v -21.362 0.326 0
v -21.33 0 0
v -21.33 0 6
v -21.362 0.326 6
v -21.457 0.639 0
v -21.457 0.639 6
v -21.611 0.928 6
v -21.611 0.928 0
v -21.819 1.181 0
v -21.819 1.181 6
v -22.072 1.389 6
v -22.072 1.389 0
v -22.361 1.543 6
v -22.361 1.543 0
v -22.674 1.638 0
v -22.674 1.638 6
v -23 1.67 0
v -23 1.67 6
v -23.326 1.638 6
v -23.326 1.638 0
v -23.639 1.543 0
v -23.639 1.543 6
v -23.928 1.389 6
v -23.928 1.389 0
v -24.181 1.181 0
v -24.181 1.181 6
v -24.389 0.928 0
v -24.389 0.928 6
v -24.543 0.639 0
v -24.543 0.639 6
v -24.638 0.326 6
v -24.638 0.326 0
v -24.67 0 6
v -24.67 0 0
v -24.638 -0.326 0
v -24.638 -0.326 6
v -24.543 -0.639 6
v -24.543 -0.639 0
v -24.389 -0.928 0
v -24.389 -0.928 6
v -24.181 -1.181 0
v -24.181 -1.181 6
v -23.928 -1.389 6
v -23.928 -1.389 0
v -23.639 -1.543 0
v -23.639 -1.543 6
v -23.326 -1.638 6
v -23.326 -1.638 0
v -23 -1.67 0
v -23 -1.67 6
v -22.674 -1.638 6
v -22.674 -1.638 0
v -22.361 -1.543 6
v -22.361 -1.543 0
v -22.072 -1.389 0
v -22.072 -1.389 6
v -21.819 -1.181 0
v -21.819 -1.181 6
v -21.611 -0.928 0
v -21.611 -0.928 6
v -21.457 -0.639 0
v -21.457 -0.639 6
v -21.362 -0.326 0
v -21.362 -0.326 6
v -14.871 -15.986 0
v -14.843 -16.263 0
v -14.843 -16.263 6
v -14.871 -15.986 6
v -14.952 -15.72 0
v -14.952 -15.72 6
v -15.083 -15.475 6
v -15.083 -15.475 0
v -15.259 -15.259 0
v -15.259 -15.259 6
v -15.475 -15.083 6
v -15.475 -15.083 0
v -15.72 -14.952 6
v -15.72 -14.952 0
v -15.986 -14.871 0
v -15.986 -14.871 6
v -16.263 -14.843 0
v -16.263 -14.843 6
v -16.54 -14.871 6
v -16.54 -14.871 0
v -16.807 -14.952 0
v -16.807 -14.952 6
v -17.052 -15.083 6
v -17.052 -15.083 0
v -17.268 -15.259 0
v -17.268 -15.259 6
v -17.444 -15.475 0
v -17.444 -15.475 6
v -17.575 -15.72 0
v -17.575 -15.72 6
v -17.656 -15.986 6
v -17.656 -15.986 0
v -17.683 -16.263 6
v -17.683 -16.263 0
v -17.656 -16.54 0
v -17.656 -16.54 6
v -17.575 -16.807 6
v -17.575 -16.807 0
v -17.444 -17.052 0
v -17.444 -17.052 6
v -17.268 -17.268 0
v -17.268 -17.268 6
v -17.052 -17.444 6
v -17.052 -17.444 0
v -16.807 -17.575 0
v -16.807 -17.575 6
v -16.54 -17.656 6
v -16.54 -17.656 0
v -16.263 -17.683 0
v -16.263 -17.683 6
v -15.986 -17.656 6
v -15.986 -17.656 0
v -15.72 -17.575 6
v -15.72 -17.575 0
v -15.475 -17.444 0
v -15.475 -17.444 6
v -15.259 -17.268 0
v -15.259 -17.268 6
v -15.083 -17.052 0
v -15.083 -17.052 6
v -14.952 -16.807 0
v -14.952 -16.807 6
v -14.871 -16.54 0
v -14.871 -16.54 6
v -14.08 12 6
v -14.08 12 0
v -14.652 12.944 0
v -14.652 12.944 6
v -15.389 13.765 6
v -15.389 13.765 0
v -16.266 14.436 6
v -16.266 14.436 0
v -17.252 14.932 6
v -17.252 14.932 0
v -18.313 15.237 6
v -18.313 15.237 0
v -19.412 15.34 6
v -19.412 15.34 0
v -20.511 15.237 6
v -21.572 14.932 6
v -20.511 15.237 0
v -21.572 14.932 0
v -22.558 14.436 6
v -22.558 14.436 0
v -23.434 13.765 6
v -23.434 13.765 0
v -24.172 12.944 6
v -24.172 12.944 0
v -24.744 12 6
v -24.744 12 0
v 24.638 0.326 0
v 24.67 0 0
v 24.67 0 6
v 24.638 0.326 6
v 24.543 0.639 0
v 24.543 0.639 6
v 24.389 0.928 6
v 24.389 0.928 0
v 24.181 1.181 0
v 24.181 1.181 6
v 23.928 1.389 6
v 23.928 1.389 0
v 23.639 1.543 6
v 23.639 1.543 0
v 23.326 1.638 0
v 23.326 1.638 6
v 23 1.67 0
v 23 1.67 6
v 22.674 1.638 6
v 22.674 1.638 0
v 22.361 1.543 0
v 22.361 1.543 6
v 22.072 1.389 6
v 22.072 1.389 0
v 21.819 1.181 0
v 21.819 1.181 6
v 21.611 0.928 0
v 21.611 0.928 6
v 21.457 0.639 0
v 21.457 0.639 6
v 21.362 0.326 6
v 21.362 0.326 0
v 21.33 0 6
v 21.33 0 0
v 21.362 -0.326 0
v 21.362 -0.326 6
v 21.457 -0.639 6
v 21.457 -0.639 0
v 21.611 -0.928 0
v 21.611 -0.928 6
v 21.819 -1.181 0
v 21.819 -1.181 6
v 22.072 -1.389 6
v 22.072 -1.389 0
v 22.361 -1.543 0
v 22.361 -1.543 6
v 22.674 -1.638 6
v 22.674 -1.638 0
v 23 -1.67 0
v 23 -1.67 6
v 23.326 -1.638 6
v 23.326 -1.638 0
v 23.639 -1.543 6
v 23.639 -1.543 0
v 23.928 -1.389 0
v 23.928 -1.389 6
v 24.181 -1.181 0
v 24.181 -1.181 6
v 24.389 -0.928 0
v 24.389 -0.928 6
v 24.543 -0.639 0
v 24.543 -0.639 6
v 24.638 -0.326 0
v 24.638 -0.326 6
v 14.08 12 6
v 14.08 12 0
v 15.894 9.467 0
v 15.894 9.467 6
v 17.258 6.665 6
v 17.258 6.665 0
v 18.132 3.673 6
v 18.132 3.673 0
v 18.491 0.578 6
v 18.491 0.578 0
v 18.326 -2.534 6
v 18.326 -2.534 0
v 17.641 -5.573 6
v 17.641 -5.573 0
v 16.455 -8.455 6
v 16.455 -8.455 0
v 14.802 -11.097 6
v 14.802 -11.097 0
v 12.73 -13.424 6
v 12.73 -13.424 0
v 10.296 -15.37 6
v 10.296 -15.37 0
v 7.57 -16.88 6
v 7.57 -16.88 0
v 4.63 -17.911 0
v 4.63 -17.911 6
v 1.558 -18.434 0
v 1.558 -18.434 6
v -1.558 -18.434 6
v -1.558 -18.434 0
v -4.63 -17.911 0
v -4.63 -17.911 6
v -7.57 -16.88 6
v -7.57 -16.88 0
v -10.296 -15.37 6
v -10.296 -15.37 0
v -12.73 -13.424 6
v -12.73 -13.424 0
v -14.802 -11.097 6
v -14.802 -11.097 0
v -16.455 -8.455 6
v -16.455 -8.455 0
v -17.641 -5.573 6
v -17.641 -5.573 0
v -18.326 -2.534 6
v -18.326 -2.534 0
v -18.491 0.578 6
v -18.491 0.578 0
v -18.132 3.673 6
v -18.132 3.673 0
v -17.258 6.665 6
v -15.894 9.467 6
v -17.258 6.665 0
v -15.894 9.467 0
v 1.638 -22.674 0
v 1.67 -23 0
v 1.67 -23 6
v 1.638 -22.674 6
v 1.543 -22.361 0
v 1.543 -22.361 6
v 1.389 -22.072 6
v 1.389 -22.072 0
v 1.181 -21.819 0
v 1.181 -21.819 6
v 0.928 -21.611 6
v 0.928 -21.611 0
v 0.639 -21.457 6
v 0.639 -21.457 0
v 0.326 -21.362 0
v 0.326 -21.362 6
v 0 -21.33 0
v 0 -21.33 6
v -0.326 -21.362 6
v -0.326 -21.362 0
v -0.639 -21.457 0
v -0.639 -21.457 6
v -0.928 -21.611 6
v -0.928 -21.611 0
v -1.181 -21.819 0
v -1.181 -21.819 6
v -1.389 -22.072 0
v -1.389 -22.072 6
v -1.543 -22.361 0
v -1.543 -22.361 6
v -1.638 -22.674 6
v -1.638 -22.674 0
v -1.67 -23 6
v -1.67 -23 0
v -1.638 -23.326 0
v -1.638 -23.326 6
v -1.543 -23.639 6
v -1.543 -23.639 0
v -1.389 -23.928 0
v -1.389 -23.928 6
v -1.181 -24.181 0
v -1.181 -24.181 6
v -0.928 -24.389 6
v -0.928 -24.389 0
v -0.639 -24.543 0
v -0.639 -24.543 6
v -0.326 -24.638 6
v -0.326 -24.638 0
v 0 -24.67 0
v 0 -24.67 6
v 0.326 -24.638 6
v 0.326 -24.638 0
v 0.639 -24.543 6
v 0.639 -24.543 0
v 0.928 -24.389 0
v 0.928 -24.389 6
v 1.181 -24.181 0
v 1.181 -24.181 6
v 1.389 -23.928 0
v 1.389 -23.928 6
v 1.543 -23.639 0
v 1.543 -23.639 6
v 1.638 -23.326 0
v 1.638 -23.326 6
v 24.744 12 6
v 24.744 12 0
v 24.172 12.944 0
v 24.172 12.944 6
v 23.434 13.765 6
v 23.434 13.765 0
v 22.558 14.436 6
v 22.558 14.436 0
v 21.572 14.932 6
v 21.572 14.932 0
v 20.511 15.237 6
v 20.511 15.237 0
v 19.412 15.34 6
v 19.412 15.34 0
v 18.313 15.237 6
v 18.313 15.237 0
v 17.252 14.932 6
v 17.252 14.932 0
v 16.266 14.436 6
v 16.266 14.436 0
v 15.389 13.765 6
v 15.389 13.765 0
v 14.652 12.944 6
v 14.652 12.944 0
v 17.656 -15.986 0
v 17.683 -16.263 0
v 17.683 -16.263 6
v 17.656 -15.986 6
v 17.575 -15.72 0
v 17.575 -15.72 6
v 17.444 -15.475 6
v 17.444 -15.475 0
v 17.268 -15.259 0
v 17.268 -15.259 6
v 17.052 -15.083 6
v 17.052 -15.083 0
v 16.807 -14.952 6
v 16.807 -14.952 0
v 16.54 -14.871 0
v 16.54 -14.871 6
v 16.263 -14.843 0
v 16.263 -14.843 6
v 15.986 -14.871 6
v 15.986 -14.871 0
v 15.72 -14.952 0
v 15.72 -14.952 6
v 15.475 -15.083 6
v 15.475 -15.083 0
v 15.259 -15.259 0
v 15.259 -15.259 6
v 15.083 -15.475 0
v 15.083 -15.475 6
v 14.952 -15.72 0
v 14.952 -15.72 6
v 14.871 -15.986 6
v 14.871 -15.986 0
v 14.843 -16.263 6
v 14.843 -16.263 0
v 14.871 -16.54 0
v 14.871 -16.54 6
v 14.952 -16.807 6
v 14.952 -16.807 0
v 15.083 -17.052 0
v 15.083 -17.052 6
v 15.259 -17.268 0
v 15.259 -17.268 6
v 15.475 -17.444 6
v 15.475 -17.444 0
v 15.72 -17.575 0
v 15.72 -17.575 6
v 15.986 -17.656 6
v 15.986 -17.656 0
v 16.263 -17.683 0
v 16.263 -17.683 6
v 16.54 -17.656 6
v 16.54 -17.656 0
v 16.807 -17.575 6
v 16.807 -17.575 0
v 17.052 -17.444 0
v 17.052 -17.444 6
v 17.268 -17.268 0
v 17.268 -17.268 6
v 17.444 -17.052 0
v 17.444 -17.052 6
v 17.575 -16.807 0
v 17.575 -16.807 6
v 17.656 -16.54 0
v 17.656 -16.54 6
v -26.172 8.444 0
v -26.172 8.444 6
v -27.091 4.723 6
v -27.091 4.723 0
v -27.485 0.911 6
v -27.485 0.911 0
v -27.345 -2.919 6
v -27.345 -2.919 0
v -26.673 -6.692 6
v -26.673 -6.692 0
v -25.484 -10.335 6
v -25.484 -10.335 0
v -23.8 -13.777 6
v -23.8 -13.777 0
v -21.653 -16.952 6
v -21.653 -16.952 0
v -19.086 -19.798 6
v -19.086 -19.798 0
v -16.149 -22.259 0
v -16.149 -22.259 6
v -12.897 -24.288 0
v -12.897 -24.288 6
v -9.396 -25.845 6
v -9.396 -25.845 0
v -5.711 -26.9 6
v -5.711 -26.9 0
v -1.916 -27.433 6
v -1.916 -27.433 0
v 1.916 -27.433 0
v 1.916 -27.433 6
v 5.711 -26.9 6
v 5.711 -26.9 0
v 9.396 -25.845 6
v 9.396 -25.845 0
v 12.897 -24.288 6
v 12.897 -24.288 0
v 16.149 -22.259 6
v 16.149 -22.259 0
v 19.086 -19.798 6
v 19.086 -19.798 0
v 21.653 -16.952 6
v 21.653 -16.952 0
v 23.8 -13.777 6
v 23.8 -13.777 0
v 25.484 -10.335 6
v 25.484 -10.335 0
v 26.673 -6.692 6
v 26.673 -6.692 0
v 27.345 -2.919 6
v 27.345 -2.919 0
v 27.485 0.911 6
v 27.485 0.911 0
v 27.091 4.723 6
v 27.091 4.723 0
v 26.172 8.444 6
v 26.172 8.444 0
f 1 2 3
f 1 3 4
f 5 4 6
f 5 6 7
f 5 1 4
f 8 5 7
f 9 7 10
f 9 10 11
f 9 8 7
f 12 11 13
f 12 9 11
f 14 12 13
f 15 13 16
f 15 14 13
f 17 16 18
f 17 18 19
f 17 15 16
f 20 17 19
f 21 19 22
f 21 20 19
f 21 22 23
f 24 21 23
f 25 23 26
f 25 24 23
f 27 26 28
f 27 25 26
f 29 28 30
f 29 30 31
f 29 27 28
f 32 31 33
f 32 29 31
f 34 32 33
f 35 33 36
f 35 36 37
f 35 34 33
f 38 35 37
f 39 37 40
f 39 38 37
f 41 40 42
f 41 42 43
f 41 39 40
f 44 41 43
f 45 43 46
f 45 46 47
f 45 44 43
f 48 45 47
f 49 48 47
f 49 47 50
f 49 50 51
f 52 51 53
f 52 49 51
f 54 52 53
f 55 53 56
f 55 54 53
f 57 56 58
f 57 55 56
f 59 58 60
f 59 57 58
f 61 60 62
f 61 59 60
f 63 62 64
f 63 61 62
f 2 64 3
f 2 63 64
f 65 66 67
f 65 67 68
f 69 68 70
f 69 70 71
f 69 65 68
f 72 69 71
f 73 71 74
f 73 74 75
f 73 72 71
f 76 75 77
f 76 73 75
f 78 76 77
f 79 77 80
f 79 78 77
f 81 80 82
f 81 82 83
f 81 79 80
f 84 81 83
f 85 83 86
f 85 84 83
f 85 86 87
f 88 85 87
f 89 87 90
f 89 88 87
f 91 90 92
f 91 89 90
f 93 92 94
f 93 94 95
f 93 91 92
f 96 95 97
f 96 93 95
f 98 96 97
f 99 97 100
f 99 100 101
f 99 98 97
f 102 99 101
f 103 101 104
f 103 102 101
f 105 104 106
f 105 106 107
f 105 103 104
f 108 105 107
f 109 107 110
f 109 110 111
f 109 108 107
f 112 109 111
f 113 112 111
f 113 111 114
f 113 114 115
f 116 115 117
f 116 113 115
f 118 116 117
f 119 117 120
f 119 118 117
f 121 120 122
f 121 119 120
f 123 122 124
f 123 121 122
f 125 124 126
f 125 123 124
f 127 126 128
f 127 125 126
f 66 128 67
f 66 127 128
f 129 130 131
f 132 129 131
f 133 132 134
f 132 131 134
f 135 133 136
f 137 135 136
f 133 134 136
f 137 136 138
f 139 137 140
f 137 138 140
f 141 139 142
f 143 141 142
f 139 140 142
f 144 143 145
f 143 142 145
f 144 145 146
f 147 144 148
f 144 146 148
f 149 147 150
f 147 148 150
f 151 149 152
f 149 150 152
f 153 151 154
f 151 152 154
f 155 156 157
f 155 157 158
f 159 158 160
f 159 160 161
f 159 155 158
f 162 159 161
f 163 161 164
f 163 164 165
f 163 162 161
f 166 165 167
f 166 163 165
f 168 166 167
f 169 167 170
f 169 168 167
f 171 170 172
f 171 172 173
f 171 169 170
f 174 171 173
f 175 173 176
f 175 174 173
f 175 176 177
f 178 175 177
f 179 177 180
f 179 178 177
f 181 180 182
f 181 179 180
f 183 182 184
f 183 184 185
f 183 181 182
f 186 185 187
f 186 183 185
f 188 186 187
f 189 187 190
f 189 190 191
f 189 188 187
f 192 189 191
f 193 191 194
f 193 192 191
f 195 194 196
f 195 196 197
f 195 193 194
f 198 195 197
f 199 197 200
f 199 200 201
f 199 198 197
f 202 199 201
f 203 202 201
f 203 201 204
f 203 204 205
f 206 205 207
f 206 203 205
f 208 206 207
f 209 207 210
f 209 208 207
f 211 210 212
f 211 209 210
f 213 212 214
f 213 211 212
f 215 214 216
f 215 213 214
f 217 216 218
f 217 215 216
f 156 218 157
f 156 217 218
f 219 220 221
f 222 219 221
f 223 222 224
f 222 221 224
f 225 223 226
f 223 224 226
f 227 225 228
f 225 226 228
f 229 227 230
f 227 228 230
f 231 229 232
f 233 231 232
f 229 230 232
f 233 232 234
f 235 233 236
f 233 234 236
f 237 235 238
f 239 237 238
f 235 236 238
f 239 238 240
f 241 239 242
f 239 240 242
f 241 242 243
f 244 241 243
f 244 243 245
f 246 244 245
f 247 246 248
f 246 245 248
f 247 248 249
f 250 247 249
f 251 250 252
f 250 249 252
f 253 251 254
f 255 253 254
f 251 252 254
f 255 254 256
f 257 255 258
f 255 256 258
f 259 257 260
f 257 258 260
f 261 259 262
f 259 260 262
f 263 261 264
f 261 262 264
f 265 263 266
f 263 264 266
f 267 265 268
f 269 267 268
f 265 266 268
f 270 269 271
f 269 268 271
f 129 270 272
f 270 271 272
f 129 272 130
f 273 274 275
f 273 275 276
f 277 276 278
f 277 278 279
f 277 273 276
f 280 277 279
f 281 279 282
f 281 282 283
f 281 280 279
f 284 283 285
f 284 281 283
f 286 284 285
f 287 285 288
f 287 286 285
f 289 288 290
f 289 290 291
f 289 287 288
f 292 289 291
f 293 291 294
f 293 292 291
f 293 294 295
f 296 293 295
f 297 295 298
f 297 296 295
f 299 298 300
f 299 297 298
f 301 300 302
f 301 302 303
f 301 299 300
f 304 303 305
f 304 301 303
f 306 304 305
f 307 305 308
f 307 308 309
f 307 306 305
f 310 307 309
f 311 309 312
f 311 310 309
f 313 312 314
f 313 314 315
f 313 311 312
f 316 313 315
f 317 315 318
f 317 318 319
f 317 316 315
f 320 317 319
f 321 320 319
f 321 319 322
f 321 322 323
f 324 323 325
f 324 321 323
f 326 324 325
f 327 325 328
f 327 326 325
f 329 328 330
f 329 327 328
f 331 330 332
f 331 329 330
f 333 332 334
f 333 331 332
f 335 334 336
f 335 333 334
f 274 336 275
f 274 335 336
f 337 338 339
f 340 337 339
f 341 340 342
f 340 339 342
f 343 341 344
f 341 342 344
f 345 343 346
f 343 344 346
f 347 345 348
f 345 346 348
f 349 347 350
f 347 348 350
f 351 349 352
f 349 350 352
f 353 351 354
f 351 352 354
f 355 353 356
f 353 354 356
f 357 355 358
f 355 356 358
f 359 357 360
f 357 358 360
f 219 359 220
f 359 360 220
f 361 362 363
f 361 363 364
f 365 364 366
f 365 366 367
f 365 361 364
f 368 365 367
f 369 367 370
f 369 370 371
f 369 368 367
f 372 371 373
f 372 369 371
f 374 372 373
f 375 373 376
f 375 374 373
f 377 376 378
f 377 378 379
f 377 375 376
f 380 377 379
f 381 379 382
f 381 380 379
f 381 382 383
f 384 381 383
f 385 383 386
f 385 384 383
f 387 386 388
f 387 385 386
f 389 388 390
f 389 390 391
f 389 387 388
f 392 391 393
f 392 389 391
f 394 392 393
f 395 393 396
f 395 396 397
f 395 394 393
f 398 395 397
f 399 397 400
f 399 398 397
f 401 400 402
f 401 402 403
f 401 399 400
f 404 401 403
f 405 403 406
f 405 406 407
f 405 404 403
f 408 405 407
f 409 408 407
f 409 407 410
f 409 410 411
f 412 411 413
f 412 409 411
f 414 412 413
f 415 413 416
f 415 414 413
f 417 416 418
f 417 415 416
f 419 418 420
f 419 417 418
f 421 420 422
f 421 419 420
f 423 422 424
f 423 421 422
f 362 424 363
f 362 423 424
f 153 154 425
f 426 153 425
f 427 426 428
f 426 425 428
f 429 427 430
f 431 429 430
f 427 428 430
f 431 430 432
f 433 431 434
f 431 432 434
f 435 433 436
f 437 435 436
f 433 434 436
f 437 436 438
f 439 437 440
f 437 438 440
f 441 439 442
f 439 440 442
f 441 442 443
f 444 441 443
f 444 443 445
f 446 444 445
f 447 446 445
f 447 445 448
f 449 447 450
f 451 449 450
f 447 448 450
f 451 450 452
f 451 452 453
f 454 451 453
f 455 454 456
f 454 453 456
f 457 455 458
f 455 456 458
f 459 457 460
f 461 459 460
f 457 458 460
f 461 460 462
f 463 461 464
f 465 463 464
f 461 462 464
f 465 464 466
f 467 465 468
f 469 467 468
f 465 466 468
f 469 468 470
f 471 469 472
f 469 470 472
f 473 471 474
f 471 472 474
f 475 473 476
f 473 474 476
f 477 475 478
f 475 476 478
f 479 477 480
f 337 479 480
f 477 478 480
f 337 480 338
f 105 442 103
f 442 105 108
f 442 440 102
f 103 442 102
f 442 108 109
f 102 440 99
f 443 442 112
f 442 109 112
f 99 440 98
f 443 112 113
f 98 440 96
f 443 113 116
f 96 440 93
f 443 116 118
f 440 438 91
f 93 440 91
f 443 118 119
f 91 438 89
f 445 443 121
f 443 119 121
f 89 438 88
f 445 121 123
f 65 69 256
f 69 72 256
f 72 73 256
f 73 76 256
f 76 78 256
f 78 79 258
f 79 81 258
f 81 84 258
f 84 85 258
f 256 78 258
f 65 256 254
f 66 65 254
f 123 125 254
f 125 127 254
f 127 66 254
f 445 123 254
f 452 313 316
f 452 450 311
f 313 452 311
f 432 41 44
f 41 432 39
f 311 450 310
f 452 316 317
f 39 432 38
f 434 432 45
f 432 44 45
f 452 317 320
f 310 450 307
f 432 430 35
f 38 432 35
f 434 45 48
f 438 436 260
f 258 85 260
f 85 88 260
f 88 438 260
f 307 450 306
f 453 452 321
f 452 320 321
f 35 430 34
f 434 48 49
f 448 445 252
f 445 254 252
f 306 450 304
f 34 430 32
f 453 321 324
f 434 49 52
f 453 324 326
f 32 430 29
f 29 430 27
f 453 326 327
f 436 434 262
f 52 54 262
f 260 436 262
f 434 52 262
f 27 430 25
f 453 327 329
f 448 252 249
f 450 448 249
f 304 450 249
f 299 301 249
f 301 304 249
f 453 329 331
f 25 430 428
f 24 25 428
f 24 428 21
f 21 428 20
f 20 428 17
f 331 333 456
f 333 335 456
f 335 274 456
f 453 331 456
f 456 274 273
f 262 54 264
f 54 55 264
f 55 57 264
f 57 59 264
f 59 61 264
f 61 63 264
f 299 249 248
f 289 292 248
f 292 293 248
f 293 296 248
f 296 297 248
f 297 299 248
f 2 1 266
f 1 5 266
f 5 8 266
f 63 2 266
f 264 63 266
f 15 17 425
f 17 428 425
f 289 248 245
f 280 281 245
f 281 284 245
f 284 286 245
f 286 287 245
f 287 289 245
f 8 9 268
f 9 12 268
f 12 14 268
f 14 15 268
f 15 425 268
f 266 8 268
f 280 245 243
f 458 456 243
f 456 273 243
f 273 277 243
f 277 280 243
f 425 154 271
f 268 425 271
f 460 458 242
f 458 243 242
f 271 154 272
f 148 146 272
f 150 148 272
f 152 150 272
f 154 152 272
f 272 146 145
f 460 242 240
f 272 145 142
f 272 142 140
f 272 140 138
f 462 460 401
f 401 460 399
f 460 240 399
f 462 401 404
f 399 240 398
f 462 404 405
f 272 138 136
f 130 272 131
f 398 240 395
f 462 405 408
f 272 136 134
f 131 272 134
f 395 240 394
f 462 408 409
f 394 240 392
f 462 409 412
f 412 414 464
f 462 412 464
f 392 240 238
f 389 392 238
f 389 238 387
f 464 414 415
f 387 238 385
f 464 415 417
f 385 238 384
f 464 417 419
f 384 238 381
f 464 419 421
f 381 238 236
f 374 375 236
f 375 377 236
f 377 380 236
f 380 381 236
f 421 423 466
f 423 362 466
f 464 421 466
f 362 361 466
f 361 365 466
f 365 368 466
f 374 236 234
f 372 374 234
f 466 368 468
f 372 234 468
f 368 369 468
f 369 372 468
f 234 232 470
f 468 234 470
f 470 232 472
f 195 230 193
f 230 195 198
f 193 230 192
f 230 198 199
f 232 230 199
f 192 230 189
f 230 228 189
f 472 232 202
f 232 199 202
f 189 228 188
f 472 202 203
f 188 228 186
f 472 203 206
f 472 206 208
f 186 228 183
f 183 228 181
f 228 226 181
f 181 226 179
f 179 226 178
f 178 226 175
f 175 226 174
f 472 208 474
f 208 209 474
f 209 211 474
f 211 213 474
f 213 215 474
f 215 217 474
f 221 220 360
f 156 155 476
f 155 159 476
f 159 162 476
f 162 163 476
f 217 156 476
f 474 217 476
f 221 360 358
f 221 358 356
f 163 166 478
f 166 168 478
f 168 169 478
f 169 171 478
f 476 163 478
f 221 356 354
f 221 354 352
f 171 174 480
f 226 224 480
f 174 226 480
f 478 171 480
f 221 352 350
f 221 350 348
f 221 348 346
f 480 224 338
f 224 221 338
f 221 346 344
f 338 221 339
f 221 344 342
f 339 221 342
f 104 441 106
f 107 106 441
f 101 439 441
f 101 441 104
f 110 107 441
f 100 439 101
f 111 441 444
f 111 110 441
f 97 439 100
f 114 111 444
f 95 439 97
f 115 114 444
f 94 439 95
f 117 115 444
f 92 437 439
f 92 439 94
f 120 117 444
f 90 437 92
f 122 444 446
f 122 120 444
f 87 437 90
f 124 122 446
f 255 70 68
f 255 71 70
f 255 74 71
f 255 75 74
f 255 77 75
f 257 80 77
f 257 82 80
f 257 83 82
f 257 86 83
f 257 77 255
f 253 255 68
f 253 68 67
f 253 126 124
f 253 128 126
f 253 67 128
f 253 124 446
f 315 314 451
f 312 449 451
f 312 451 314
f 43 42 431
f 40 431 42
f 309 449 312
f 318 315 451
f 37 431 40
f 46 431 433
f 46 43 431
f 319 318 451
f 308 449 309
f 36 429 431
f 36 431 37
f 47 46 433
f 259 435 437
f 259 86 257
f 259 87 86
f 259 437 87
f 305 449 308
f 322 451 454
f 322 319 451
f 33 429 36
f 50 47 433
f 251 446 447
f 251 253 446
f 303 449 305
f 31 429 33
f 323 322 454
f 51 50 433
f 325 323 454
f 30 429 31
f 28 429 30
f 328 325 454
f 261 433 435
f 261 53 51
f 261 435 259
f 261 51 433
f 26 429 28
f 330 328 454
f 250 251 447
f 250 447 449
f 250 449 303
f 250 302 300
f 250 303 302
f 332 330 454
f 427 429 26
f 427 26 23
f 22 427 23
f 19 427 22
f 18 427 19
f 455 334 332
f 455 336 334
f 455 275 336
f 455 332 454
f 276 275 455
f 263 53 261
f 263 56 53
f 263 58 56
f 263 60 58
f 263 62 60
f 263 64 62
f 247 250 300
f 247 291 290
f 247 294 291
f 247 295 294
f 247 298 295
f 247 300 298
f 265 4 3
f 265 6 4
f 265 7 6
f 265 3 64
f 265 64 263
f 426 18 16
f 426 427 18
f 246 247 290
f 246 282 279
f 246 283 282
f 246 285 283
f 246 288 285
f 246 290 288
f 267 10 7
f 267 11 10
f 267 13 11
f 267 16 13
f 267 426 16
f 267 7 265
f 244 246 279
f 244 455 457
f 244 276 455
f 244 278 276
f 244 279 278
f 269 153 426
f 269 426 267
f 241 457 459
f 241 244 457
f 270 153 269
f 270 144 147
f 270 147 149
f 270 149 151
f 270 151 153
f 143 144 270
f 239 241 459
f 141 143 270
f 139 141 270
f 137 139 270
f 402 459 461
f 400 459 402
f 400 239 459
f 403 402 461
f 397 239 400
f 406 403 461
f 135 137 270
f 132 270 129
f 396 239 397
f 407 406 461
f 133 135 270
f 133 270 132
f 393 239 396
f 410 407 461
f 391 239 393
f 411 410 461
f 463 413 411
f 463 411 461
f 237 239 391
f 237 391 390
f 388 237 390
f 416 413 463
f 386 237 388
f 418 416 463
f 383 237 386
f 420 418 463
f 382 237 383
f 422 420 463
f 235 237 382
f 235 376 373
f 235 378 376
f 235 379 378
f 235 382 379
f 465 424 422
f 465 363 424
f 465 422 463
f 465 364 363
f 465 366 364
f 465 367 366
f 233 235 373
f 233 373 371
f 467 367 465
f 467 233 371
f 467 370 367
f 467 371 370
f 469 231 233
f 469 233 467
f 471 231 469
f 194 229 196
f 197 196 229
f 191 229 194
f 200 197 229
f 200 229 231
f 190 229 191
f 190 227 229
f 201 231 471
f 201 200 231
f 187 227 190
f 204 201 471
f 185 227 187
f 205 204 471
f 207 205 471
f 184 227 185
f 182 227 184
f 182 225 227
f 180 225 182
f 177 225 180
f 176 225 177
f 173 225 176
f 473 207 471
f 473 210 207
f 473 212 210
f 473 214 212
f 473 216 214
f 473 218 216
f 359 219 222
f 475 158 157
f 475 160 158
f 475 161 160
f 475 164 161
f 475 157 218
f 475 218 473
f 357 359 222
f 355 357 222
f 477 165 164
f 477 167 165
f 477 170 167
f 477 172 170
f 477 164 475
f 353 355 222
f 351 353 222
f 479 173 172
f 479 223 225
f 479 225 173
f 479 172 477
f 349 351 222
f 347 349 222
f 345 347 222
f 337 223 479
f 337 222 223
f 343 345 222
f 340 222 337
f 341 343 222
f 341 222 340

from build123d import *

# Parameters (mm, degrees)
SKETCH1_R           = 1.75
SKETCH1_R_2         = 1.5
BOSS_EXTRUDE1_DEPTH = 6
MOVE_FACE1_BY       = 0.08
MOVE_FACE1_2_BY     = 0.08
MOVE_FACE1_3_BY     = 0.08
MOVE_FACE1_4_BY     = 0.08
MOVE_FACE1_5_BY     = 0.08


with BuildPart() as part:
    # Sketch1 → Boss-Extrude1 (new body)
    with BuildSketch(Plane.XY):
        with BuildLine():
            ThreePointArc((-24.743686063, 12), (0, -27.5), (24.743686063, 12))
            ThreePointArc((24.743686063, 12), (19.411906952, 15.339946038), (14.08012784, 12))
            ThreePointArc((14.08012784, 12), (0, -18.5), (-14.08012784, 12))
            ThreePointArc((-14.08012784, 12), (-19.411906952, 15.339946038), (-24.743686063, 12))
        make_face()
        with Locations((0, -23)):
            Circle(SKETCH1_R, mode=Mode.SUBTRACT)
        with Locations((-16.263455967, -16.263455967)):
            Circle(SKETCH1_R_2, mode=Mode.SUBTRACT)
        with Locations((-23, 0)):
            Circle(SKETCH1_R, mode=Mode.SUBTRACT)
        with Locations((23, 0)):
            Circle(SKETCH1_R, mode=Mode.SUBTRACT)
        with Locations((16.263455967, -16.263455967)):
            Circle(SKETCH1_R_2, mode=Mode.SUBTRACT)
    extrude(amount=BOSS_EXTRUDE1_DEPTH)

    # Move Face1: a curved face moved outward by 0.08
    add(Solid.thicken(part.faces().sort_by_distance((-24.75, 0, 3))[0], MOVE_FACE1_BY))

    # Move Face1 2: a curved face moved outward by 0.08
    add(Solid.thicken(part.faces().sort_by_distance((-1.75, -23, 3))[0], MOVE_FACE1_2_BY))

    # Move Face1 3: a curved face moved outward by 0.08
    add(Solid.thicken(part.faces().sort_by_distance((-17.763455967, -16.263455967, 3))[0], MOVE_FACE1_3_BY))

    # Move Face1 4: a curved face moved outward by 0.08
    add(Solid.thicken(part.faces().sort_by_distance((21.25, 0, 3))[0], MOVE_FACE1_4_BY))

    # Move Face1 5: a curved face moved outward by 0.08
    add(Solid.thicken(part.faces().sort_by_distance((14.763455967, -16.263455967, 3))[0], MOVE_FACE1_5_BY))


solid = part.part
